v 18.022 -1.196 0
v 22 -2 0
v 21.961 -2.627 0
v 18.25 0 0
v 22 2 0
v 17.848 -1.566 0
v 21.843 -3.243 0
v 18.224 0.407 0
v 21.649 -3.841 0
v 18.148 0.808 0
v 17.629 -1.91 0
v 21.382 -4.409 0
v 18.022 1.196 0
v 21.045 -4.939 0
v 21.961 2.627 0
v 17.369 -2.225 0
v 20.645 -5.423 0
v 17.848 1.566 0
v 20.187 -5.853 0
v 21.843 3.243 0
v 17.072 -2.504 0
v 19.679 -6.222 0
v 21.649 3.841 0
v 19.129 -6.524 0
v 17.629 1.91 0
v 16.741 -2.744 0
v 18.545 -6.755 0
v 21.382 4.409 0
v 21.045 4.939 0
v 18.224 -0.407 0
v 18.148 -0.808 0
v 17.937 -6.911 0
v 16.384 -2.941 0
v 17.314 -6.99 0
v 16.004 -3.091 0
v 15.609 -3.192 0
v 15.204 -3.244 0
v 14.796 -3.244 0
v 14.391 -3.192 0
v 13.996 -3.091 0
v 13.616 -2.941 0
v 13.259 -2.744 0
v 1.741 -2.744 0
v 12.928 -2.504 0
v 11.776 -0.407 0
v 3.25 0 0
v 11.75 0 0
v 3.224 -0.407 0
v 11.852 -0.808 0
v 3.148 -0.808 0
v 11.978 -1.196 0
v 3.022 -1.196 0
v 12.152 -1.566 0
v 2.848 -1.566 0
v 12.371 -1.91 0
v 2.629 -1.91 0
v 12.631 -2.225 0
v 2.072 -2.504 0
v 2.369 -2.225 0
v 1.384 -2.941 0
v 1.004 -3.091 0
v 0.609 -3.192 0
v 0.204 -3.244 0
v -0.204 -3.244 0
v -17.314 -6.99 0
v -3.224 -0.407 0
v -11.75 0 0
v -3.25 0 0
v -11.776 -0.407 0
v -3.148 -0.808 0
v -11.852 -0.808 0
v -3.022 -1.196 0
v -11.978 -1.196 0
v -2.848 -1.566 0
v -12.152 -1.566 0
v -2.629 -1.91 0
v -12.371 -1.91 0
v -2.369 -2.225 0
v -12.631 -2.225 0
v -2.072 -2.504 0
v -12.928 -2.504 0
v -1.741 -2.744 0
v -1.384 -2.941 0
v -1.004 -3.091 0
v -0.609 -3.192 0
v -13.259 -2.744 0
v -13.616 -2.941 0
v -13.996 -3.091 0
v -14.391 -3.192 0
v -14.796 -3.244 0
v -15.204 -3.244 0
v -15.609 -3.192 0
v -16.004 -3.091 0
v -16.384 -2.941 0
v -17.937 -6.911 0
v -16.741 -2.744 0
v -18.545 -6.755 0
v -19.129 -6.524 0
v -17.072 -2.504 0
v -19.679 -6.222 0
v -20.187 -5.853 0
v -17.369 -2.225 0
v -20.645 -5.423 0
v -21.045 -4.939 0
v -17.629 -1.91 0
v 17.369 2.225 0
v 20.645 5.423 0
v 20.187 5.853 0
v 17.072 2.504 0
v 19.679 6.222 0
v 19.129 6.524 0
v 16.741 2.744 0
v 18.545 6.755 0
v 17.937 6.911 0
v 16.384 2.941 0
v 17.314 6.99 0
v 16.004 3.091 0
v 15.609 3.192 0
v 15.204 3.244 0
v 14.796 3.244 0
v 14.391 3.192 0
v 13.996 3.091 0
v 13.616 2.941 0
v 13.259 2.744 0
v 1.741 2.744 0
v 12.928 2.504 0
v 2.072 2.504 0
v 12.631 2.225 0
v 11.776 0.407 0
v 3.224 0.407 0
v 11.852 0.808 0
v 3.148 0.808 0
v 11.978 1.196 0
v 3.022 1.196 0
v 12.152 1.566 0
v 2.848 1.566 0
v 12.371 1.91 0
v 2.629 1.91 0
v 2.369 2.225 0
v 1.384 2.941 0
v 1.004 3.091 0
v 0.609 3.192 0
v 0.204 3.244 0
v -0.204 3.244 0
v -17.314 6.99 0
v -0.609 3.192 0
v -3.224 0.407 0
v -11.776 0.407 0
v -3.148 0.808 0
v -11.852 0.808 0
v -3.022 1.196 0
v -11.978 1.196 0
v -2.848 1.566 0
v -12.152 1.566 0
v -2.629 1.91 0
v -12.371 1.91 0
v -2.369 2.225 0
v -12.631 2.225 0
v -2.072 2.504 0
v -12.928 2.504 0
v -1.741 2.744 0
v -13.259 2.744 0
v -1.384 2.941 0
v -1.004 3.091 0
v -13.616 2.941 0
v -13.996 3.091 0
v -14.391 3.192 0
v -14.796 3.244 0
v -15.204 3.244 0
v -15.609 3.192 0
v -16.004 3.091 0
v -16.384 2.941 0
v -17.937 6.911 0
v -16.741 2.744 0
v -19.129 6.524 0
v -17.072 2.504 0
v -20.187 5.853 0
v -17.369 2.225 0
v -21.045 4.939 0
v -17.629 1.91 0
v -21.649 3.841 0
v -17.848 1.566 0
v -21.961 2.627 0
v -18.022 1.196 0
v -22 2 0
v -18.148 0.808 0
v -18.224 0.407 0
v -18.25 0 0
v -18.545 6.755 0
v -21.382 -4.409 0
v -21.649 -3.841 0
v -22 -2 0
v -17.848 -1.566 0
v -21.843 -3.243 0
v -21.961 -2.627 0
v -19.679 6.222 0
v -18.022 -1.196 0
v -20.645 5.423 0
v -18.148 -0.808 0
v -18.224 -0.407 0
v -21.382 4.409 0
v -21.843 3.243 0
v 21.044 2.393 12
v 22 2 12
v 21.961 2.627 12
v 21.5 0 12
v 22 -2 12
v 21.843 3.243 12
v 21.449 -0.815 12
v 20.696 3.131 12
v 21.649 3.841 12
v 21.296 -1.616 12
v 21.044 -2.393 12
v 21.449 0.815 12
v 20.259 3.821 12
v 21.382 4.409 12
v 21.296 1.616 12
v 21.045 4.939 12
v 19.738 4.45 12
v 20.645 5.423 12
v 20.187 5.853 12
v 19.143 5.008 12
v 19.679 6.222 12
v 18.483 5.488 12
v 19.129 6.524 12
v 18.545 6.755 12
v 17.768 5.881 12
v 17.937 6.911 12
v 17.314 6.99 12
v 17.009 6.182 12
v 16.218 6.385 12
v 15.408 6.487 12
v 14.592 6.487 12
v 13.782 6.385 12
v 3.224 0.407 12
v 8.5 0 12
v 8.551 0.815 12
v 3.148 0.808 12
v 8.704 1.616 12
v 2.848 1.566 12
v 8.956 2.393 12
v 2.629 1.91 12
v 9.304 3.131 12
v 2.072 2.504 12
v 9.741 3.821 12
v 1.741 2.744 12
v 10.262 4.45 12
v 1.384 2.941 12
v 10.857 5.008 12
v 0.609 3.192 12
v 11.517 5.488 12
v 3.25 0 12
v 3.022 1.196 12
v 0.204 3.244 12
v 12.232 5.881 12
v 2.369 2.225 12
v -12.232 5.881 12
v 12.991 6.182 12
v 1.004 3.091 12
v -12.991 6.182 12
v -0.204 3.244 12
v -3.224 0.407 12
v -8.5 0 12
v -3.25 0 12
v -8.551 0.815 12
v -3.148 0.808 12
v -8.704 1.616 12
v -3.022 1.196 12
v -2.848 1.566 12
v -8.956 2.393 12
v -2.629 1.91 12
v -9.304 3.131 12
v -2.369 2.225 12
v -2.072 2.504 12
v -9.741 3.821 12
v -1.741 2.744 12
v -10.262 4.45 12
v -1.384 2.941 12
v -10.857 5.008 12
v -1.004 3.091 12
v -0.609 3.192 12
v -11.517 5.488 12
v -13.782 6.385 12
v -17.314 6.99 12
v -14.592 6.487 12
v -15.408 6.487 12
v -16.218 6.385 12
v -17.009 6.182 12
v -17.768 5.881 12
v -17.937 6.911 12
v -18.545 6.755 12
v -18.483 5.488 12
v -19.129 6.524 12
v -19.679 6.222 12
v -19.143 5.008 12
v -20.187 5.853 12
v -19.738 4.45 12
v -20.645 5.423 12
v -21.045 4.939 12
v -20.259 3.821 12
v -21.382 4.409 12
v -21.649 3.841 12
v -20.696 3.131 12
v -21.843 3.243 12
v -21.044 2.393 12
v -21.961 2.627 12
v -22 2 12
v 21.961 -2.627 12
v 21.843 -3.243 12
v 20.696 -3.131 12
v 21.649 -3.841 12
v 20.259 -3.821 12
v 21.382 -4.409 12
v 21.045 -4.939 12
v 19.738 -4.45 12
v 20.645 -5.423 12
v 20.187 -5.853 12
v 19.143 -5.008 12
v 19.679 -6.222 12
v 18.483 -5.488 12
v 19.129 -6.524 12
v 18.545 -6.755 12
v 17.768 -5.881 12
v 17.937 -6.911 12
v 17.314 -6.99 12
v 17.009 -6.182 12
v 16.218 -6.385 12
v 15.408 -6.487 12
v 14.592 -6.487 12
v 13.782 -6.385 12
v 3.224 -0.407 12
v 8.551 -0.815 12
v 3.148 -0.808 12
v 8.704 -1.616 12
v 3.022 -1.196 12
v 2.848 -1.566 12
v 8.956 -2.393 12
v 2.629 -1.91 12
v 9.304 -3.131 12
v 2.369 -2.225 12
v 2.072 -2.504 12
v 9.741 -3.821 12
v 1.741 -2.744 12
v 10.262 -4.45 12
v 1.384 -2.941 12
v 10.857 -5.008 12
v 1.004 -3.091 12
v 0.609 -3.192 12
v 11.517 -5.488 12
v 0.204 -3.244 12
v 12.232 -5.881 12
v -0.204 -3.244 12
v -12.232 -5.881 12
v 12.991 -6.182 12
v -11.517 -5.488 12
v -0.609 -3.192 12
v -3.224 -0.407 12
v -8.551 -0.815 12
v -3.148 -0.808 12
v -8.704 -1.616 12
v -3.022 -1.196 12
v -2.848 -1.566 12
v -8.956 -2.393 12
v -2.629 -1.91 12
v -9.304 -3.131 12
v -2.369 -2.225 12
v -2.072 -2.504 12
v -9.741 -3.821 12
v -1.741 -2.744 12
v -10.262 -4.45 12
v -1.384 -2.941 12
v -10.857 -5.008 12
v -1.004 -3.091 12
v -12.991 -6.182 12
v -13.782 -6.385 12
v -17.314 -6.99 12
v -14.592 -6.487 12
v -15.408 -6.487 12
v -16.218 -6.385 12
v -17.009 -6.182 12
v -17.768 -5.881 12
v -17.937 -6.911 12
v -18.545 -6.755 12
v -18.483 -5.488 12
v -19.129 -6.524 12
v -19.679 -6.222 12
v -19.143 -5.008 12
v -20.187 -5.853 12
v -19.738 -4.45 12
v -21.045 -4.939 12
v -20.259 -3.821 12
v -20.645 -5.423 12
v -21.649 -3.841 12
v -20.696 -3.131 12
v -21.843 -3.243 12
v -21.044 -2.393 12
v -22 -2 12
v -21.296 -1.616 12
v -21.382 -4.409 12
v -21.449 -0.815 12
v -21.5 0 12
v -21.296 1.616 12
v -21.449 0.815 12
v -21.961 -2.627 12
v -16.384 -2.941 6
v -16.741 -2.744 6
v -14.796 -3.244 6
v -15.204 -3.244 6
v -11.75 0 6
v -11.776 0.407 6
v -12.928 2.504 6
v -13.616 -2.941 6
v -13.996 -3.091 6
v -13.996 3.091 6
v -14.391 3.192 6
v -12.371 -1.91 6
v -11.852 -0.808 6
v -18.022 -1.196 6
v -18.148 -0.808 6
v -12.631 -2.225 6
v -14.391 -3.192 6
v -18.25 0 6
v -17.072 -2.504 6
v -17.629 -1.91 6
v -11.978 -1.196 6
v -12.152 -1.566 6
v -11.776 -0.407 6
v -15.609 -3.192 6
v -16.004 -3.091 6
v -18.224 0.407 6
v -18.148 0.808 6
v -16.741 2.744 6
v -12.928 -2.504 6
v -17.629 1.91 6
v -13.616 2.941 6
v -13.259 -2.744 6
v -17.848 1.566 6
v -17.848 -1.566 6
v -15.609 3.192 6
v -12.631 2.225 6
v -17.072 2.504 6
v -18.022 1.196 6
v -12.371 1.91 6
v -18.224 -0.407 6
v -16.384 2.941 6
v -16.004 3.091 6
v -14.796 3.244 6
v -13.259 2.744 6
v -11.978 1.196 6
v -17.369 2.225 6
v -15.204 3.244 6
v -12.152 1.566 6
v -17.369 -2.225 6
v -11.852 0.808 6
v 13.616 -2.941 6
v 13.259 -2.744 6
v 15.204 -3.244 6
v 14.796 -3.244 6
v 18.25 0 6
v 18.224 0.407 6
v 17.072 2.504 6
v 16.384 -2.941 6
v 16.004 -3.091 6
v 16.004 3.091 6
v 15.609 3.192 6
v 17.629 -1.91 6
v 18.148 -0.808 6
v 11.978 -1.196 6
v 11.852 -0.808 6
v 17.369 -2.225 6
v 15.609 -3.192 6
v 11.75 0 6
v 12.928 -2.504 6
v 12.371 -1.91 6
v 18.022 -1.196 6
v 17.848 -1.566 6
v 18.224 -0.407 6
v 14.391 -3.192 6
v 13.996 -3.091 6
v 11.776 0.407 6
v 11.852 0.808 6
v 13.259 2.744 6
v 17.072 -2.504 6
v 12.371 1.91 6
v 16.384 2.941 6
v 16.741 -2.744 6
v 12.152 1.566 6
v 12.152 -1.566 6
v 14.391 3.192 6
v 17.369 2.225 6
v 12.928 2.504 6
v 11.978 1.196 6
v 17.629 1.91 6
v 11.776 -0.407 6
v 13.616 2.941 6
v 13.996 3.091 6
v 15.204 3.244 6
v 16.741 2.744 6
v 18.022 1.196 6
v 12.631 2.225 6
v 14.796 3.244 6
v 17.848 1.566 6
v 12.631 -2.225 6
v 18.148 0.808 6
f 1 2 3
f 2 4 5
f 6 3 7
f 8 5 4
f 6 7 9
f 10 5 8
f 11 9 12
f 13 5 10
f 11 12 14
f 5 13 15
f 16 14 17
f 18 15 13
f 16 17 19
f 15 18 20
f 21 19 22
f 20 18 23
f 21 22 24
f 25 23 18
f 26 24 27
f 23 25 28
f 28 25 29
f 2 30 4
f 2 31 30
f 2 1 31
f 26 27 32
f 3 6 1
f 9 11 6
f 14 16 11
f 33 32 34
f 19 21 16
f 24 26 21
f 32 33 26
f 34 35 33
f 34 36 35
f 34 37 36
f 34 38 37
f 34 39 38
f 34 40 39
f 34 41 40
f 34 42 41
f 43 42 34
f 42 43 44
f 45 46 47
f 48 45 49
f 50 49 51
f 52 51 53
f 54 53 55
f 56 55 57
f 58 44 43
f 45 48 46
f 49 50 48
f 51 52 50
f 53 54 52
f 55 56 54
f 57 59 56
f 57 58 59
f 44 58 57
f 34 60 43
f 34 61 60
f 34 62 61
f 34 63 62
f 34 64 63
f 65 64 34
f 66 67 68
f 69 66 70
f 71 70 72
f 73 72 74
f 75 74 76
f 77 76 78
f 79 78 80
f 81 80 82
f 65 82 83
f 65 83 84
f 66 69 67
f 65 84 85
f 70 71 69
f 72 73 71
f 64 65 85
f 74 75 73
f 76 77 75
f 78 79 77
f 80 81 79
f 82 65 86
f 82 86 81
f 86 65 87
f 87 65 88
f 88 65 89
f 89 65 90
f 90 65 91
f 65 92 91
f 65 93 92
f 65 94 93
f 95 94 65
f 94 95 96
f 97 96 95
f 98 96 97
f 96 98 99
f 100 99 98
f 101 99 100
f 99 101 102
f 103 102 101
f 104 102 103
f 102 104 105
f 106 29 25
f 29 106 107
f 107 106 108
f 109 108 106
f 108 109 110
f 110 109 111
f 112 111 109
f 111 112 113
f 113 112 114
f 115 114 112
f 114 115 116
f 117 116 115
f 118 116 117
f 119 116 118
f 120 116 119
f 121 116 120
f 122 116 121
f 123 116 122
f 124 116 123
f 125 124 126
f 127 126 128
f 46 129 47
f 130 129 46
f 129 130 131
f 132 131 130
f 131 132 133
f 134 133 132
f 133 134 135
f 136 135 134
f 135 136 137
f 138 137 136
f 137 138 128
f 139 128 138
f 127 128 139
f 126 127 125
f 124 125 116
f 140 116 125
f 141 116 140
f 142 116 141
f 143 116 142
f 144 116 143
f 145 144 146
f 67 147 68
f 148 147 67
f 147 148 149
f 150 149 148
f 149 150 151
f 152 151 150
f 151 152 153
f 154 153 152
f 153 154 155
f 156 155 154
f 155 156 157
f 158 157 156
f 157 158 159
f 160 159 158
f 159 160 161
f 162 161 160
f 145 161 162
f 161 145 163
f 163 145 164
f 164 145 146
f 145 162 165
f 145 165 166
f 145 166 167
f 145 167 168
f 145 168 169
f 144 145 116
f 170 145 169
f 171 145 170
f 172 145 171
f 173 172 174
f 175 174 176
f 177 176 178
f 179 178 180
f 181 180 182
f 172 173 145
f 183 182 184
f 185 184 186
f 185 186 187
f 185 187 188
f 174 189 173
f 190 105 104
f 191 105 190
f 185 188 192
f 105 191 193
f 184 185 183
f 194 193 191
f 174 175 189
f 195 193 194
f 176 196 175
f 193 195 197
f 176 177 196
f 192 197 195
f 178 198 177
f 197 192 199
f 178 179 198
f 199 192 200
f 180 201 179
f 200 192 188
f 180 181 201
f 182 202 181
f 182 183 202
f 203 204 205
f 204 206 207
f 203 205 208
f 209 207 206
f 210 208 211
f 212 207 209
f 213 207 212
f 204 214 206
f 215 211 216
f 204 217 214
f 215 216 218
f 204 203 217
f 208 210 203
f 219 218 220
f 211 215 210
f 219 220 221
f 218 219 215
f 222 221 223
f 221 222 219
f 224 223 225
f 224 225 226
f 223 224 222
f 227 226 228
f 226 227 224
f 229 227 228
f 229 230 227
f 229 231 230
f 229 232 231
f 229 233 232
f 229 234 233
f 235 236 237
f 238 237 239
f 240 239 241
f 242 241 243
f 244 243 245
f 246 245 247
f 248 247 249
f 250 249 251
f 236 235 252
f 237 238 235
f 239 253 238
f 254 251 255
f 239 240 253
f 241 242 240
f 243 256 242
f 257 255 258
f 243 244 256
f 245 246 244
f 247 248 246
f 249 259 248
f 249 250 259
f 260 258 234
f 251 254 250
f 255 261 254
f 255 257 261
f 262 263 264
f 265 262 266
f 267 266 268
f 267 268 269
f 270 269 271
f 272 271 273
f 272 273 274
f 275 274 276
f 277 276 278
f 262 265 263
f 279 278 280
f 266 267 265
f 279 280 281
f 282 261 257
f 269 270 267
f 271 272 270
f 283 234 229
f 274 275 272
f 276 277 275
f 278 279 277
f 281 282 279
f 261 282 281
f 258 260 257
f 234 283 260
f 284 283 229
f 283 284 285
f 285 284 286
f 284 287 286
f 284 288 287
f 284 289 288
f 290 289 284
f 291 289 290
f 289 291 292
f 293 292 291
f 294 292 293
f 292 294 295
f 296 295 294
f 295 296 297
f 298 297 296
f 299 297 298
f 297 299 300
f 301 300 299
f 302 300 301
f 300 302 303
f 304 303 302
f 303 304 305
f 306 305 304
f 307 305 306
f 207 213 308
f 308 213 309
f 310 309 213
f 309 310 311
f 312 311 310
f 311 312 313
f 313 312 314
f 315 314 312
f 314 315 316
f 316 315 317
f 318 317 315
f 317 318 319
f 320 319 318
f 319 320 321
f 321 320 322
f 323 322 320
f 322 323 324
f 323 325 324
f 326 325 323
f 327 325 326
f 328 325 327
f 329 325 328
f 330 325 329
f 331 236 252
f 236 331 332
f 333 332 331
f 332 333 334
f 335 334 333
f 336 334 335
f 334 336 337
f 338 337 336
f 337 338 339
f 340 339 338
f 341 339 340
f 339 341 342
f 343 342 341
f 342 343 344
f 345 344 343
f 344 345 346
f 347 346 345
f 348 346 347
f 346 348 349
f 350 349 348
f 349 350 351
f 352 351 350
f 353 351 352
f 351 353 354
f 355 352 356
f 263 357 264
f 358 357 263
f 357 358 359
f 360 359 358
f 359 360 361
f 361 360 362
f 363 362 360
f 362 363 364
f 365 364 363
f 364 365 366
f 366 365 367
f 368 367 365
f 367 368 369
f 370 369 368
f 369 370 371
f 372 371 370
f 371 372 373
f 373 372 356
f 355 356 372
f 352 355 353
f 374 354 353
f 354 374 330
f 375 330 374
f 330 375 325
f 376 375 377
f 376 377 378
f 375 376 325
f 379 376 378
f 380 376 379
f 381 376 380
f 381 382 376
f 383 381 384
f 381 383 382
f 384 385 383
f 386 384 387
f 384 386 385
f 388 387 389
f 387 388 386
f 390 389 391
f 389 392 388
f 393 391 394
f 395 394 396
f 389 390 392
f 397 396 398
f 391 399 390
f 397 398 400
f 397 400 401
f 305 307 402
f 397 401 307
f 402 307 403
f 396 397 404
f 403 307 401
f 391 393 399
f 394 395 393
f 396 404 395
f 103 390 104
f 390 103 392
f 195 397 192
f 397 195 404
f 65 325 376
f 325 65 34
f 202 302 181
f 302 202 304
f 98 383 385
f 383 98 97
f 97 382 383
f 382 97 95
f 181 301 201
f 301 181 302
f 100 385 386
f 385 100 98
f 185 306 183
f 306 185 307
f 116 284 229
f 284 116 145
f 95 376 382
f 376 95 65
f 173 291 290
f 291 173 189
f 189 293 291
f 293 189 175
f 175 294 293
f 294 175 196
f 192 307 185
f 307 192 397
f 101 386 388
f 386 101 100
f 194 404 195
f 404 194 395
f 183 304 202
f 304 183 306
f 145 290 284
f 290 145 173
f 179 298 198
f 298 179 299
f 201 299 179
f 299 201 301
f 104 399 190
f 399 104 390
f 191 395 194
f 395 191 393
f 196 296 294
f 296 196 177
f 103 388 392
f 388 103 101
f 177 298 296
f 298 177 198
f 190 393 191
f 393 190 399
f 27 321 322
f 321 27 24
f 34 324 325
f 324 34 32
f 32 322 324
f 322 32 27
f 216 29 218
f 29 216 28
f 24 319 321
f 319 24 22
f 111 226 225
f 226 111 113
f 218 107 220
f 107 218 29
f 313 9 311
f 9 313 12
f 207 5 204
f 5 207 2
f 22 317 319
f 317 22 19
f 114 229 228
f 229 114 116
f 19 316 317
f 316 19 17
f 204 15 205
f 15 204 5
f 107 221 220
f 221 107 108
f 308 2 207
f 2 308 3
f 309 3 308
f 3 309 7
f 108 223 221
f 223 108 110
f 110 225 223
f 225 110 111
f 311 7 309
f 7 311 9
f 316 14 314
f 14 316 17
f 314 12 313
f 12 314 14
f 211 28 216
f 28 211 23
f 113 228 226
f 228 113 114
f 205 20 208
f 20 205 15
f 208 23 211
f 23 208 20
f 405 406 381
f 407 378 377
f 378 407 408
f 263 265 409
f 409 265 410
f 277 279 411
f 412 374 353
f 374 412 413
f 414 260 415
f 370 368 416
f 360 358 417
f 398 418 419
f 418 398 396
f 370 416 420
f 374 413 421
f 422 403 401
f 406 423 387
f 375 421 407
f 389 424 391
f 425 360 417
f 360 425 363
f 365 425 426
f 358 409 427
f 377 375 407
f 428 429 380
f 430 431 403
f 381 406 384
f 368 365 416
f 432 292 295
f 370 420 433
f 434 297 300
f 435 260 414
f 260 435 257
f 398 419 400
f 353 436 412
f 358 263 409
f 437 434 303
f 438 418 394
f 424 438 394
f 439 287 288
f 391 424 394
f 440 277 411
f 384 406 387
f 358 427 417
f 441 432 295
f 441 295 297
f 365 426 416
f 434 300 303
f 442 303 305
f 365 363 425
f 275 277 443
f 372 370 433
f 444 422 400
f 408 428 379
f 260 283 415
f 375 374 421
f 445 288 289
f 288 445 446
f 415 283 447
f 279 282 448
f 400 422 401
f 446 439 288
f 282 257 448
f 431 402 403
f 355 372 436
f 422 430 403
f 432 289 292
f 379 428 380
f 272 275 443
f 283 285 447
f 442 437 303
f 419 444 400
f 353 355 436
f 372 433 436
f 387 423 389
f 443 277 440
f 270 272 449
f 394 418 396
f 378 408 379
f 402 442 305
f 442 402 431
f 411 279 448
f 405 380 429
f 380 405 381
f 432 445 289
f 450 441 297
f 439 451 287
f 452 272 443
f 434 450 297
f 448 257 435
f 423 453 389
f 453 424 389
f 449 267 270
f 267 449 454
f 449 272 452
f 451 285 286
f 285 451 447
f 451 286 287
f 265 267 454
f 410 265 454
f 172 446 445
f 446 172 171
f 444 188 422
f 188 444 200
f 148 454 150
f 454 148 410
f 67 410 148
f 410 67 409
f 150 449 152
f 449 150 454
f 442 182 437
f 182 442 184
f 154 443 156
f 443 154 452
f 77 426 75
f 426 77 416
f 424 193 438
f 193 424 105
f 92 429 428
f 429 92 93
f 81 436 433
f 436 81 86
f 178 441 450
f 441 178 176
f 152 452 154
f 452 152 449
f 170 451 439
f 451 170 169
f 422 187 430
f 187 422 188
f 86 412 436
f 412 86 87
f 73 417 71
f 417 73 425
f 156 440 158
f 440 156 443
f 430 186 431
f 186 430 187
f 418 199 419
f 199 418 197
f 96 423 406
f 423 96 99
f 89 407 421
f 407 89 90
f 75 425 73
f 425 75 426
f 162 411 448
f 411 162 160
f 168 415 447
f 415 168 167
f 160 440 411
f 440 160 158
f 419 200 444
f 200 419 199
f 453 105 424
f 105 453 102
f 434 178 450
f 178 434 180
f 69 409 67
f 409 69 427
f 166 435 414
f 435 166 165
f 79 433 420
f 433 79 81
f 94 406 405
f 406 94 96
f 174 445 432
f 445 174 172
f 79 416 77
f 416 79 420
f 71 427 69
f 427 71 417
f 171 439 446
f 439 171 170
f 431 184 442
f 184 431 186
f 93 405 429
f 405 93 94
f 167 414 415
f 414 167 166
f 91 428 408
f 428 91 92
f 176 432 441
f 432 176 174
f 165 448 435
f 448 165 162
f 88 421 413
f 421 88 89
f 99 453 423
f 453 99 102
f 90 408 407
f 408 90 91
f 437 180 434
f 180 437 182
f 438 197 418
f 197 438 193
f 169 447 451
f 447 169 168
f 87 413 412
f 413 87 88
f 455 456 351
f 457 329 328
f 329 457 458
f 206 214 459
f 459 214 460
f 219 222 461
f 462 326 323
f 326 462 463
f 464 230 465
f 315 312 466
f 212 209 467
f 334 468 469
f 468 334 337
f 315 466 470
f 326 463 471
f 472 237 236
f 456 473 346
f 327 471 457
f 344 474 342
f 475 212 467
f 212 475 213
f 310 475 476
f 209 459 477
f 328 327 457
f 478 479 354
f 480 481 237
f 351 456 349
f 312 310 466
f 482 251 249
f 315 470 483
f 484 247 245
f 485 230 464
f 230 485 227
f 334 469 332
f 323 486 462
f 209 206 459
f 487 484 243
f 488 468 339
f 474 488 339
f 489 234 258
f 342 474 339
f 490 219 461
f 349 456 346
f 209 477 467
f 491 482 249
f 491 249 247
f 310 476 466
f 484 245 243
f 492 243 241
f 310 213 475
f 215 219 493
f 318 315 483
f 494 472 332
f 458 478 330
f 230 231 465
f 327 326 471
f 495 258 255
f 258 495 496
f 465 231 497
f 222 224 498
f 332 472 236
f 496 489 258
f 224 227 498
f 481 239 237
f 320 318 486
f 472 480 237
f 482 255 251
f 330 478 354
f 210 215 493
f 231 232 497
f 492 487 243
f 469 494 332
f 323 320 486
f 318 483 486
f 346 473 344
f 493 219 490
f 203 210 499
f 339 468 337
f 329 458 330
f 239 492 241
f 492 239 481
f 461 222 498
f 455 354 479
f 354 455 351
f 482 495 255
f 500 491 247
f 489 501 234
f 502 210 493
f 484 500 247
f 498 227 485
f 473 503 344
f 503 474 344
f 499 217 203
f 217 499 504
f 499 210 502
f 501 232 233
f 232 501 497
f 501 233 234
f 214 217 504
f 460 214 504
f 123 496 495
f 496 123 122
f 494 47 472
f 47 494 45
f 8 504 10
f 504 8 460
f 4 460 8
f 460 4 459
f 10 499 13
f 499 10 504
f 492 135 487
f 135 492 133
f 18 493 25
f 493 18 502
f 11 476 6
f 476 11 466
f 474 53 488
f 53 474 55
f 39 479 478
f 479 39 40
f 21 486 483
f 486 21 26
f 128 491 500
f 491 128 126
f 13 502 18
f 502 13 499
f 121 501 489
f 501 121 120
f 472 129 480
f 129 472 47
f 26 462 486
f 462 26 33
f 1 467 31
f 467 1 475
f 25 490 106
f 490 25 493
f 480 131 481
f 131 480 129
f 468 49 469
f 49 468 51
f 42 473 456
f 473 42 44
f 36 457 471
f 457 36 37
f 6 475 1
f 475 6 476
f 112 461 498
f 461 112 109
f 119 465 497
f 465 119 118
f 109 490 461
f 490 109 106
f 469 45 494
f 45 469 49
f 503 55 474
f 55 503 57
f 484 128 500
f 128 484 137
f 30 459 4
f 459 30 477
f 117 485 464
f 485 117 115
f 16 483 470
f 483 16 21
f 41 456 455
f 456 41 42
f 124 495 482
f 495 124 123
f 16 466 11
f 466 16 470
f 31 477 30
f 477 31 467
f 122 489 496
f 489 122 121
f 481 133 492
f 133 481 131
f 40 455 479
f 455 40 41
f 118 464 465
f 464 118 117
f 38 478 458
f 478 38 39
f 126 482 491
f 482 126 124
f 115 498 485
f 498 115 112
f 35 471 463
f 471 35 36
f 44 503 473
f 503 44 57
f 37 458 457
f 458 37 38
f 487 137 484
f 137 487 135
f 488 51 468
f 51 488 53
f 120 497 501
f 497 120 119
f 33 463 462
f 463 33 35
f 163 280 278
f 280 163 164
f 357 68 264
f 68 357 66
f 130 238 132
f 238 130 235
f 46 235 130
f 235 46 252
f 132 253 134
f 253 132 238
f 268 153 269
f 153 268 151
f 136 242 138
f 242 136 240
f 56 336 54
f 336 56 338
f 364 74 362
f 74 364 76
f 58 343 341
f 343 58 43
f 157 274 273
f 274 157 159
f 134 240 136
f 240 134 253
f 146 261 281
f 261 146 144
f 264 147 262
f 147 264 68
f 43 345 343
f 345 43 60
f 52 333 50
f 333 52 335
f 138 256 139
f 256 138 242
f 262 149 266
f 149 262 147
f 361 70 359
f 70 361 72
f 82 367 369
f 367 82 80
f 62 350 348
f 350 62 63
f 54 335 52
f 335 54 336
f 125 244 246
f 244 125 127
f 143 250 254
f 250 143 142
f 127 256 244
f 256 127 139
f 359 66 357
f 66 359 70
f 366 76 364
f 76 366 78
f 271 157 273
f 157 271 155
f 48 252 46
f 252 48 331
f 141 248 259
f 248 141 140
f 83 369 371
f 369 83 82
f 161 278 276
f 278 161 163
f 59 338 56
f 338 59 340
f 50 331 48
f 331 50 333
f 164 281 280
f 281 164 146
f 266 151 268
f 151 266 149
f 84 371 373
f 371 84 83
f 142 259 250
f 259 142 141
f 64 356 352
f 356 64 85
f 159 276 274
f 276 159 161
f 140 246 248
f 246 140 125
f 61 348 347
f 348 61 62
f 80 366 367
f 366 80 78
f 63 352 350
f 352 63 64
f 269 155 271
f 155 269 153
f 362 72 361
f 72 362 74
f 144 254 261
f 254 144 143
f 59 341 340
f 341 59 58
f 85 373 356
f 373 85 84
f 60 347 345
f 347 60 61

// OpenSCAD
$fn = 50;


difference() {
	union() {
		cylinder(h = 12, r = 7.0000000000);
		translate(v = [-7.5000000000, 0.0000000000, 0]) {
			hull() {
				translate(v = [-9.5000000000, 2.0000000000, 0]) {
					cylinder(h = 12, r = 5);
				}
				translate(v = [9.5000000000, 2.0000000000, 0]) {
					cylinder(h = 12, r = 5);
				}
				translate(v = [-9.5000000000, -2.0000000000, 0]) {
					cylinder(h = 12, r = 5);
				}
				translate(v = [9.5000000000, -2.0000000000, 0]) {
					cylinder(h = 12, r = 5);
				}
			}
		}
		translate(v = [-7.5000000000, 0.0000000000, 0]) {
			hull() {
				translate(v = [-9.5000000000, 2.0000000000, 0]) {
					cylinder(h = 12, r = 5);
				}
				translate(v = [9.5000000000, 2.0000000000, 0]) {
					cylinder(h = 12, r = 5);
				}
				translate(v = [-9.5000000000, -2.0000000000, 0]) {
					cylinder(h = 12, r = 5);
				}
				translate(v = [9.5000000000, -2.0000000000, 0]) {
					cylinder(h = 12, r = 5);
				}
			}
		}
		translate(v = [7.5000000000, 0.0000000000, 0]) {
			hull() {
				translate(v = [-9.5000000000, 2.0000000000, 0]) {
					cylinder(h = 12, r = 5);
				}
				translate(v = [9.5000000000, 2.0000000000, 0]) {
					cylinder(h = 12, r = 5);
				}
				translate(v = [-9.5000000000, -2.0000000000, 0]) {
					cylinder(h = 12, r = 5);
				}
				translate(v = [9.5000000000, -2.0000000000, 0]) {
					cylinder(h = 12, r = 5);
				}
			}
		}
		translate(v = [7.5000000000, 0.0000000000, 0]) {
			hull() {
				translate(v = [-9.5000000000, 2.0000000000, 0]) {
					cylinder(h = 12, r = 5);
				}
				translate(v = [9.5000000000, 2.0000000000, 0]) {
					cylinder(h = 12, r = 5);
				}
				translate(v = [-9.5000000000, -2.0000000000, 0]) {
					cylinder(h = 12, r = 5);
				}
				translate(v = [9.5000000000, -2.0000000000, 0]) {
					cylinder(h = 12, r = 5);
				}
			}
		}
	}
	union() {
		translate(v = [-15.0000000000, 0.0000000000, 12]) {
			rotate(a = [0, 0, 0]) {
				difference() {
					union() {
						#translate(v = [0, 0, -12.0000000000]) {
							cylinder(h = 12, r = 2.2500000000);
						}
						#translate(v = [0, 0, -6]) {
							cylinder(h = 6, r1 = 3.2500000000, r2 = 6.5000000000);
						}
						#translate(v = [0, 0, -12.0000000000]) {
							cylinder(h = 12, r = 3.2500000000);
						}
						#translate(v = [0, 0, -12.0000000000]) {
							cylinder(h = 12, r = 2.2500000000);
						}
					}
					union();
				}
			}
		}
		translate(v = [-15.0000000000, 0.0000000000, 12]) {
			rotate(a = [0, 0, 0]) {
				difference() {
					union() {
						#translate(v = [0, 0, -12.0000000000]) {
							cylinder(h = 12, r = 2.2500000000);
						}
						#translate(v = [0, 0, -6]) {
							cylinder(h = 6, r1 = 3.2500000000, r2 = 6.5000000000);
						}
						#translate(v = [0, 0, -12.0000000000]) {
							cylinder(h = 12, r = 3.2500000000);
						}
						#translate(v = [0, 0, -12.0000000000]) {
							cylinder(h = 12, r = 2.2500000000);
						}
					}
					union();
				}
			}
		}
		translate(v = [15.0000000000, 0.0000000000, 12]) {
			rotate(a = [0, 0, 0]) {
				difference() {
					union() {
						#translate(v = [0, 0, -12.0000000000]) {
							cylinder(h = 12, r = 2.2500000000);
						}
						#translate(v = [0, 0, -6]) {
							cylinder(h = 6, r1 = 3.2500000000, r2 = 6.5000000000);
						}
						#translate(v = [0, 0, -12.0000000000]) {
							cylinder(h = 12, r = 3.2500000000);
						}
						#translate(v = [0, 0, -12.0000000000]) {
							cylinder(h = 12, r = 2.2500000000);
						}
					}
					union();
				}
			}
		}
		translate(v = [15.0000000000, 0.0000000000, 12]) {
			rotate(a = [0, 0, 0]) {
				difference() {
					union() {
						#translate(v = [0, 0, -12.0000000000]) {
							cylinder(h = 12, r = 2.2500000000);
						}
						#translate(v = [0, 0, -6]) {
							cylinder(h = 6, r1 = 3.2500000000, r2 = 6.5000000000);
						}
						#translate(v = [0, 0, -12.0000000000]) {
							cylinder(h = 12, r = 3.2500000000);
						}
						#translate(v = [0, 0, -12.0000000000]) {
							cylinder(h = 12, r = 2.2500000000);
						}
					}
					union();
				}
			}
		}
		translate(v = [0, 0, -100]) {
			cylinder(h = 200, r = 3.2500000000);
		}
		translate(v = [0, 0, -100]) {
			cylinder(h = 200, r = 1.8000000000);
		}
	}
}
